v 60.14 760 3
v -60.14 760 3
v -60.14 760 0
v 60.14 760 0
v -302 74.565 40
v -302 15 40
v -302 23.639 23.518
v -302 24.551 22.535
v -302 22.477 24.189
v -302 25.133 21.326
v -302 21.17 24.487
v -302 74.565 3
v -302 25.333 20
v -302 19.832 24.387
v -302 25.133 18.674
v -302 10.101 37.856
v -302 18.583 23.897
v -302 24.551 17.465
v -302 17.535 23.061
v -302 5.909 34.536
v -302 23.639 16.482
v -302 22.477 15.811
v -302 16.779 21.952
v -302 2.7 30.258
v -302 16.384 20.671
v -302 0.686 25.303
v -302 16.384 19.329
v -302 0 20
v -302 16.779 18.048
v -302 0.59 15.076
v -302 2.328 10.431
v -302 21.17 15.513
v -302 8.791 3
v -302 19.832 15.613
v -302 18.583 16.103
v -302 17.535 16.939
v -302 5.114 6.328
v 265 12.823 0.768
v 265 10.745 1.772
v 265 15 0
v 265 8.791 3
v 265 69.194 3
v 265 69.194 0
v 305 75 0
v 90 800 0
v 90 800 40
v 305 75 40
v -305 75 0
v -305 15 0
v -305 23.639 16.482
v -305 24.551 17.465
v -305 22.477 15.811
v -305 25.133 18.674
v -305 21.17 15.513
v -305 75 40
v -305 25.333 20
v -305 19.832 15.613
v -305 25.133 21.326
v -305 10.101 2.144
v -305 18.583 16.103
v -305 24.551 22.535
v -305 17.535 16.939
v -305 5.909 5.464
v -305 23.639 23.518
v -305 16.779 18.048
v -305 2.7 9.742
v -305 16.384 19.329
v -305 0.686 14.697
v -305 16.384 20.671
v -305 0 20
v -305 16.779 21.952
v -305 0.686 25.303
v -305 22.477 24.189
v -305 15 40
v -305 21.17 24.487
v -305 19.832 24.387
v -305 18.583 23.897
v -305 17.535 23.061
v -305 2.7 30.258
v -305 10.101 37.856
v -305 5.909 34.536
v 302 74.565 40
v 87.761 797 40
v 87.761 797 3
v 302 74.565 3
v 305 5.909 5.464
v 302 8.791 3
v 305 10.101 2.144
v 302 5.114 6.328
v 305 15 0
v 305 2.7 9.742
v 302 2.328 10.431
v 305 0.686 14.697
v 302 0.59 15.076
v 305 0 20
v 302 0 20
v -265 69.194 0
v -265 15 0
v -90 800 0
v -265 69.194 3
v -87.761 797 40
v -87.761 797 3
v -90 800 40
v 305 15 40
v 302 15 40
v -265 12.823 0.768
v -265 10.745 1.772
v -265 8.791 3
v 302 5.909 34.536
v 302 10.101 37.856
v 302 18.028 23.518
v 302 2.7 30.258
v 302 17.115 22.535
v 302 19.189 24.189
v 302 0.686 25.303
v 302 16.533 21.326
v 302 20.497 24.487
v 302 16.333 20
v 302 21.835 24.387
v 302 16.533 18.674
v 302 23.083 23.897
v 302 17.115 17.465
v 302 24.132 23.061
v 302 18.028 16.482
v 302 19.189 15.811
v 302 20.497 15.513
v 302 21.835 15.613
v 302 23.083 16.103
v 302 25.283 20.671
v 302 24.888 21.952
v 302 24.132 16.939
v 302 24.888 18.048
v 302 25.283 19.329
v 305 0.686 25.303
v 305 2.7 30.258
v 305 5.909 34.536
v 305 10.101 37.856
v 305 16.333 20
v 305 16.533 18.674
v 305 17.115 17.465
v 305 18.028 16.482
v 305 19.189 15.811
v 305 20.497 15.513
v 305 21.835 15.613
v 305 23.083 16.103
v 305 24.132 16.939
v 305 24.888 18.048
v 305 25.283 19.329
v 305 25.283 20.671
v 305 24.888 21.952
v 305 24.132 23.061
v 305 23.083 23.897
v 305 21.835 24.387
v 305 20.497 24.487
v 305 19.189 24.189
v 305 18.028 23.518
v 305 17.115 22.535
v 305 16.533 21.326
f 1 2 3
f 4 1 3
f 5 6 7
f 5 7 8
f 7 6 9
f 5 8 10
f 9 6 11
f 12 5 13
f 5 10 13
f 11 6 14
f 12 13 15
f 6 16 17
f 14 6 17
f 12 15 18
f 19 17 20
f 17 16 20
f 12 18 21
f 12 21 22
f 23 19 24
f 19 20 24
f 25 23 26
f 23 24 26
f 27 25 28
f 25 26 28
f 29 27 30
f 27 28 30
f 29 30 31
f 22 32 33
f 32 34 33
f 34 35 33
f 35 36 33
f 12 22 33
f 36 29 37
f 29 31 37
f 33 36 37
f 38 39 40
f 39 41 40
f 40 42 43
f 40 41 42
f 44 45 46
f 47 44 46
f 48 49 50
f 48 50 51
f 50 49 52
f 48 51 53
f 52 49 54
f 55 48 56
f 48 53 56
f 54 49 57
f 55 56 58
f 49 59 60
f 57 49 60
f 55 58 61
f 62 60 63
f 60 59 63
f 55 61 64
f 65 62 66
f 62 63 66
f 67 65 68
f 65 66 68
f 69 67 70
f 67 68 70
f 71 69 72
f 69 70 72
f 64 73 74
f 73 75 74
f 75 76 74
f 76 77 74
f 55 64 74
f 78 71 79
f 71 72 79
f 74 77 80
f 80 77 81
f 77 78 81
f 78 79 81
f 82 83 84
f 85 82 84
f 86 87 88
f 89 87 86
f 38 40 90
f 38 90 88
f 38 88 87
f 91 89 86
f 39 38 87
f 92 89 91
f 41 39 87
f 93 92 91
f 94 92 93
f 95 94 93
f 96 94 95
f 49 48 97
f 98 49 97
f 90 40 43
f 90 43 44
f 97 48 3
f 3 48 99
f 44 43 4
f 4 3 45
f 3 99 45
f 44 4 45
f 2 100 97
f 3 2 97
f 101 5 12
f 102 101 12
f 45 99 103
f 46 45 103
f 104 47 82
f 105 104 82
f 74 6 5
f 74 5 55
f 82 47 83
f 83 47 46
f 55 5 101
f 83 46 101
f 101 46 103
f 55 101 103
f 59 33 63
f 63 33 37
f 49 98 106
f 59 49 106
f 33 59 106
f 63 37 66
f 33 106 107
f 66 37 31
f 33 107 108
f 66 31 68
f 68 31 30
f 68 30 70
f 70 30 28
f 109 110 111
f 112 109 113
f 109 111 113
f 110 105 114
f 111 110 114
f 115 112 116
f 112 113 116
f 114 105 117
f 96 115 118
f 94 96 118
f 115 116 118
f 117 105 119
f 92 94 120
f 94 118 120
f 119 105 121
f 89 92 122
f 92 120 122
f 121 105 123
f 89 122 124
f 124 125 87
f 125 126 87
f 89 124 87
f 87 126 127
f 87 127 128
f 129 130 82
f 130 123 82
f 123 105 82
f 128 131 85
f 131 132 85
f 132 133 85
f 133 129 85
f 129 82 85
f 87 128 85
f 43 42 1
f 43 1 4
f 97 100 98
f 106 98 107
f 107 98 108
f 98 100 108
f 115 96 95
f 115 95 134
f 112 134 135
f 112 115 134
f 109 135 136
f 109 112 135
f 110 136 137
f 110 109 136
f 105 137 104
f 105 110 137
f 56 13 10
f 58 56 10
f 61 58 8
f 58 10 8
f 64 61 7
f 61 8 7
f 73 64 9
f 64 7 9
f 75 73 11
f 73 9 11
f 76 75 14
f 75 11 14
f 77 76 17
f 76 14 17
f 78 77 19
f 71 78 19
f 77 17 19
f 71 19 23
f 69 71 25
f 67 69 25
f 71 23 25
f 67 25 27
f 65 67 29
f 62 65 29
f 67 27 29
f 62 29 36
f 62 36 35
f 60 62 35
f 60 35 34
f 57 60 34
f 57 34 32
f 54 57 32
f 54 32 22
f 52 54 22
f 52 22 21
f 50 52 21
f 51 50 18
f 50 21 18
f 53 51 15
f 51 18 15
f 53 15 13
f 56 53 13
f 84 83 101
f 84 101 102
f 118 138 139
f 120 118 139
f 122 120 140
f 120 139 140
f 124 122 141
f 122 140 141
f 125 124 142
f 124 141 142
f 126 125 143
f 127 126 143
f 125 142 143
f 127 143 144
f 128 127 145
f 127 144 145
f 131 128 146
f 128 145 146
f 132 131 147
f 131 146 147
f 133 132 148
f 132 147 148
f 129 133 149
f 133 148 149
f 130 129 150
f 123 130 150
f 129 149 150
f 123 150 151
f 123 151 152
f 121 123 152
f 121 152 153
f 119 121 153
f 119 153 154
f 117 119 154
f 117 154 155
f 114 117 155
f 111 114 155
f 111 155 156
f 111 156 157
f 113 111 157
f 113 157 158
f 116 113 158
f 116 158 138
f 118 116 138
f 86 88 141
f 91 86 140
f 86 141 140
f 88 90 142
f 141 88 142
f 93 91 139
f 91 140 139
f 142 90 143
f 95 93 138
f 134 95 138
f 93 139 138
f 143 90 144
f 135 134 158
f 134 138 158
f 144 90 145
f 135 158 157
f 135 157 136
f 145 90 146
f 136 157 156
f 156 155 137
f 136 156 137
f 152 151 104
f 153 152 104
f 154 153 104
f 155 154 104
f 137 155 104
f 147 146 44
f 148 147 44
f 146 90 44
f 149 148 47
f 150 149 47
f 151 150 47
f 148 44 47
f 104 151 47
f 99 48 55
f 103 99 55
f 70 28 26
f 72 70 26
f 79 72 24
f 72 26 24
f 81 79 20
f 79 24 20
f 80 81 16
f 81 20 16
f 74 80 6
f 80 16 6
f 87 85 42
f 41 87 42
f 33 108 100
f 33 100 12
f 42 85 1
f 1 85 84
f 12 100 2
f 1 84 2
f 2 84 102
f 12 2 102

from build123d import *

# Parameters (mm, degrees)
F4_DEPTH      = 305.001
F4_DEPTH_BACK = 305.001
F6_D          = 9
F6_DEPTH      = 305.001
F8_D          = 9


with BuildPart() as f2:
    # F2: sweep along a path in F0
    with BuildLine(Plane.XY) as f2_path:
        Line((305, 0), (305, 75))
        Line((305, 75), (90, 800))
        Line((90, 800), (0, 800))
        Line((0, 800), (-90, 800))
        Line((-90, 800), (-305, 75))
        Line((-305, 75), (-305, 0))
    # F1 (on Front) → F2 (sweep)
    with BuildSketch(Plane.XZ):
        Polygon((265, 0), (305, 0), (305, 40), (302, 40), (302, 3), (265, 3), align=None)
    sweep(path=f2_path.line, transition=Transition.RIGHT)

    # F3 (on Right) → F4 (cut, two sides)
    with BuildSketch(Plane.YZ) as f4_sk:
        with BuildLine():
            ThreePointArc((15, 0), (4.1666666667, 7.5), (0, 20))
            Line((0, 20), (0, 0))
            Line((0, 0), (15, 0))
        make_face()
        with BuildLine():
            ThreePointArc((0, 20), (4.1666666667, 32.5), (15, 40))
            Line((15, 40), (0, 40))
            Line((0, 40), (0, 20))
        make_face()
    extrude(amount=-F4_DEPTH, mode=Mode.SUBTRACT)
    extrude(f4_sk.sketch, amount=F4_DEPTH_BACK, mode=Mode.SUBTRACT)

    # F6 (through all, one way)
    with BuildSketch(Plane.YZ):
        with Locations((20.8333333333, 20)):
            Circle(F6_D / 2)
    extrude(amount=-F6_DEPTH, mode=Mode.SUBTRACT)

    # F8 (through all)
    with Locations(Plane(origin=(0, 0, 0), x_dir=(0, 1, 0), z_dir=(-1, 0, 0))):
        with Locations((20.8333333333, -20)):
            Hole(F8_D / 2)


solid = f2.part
